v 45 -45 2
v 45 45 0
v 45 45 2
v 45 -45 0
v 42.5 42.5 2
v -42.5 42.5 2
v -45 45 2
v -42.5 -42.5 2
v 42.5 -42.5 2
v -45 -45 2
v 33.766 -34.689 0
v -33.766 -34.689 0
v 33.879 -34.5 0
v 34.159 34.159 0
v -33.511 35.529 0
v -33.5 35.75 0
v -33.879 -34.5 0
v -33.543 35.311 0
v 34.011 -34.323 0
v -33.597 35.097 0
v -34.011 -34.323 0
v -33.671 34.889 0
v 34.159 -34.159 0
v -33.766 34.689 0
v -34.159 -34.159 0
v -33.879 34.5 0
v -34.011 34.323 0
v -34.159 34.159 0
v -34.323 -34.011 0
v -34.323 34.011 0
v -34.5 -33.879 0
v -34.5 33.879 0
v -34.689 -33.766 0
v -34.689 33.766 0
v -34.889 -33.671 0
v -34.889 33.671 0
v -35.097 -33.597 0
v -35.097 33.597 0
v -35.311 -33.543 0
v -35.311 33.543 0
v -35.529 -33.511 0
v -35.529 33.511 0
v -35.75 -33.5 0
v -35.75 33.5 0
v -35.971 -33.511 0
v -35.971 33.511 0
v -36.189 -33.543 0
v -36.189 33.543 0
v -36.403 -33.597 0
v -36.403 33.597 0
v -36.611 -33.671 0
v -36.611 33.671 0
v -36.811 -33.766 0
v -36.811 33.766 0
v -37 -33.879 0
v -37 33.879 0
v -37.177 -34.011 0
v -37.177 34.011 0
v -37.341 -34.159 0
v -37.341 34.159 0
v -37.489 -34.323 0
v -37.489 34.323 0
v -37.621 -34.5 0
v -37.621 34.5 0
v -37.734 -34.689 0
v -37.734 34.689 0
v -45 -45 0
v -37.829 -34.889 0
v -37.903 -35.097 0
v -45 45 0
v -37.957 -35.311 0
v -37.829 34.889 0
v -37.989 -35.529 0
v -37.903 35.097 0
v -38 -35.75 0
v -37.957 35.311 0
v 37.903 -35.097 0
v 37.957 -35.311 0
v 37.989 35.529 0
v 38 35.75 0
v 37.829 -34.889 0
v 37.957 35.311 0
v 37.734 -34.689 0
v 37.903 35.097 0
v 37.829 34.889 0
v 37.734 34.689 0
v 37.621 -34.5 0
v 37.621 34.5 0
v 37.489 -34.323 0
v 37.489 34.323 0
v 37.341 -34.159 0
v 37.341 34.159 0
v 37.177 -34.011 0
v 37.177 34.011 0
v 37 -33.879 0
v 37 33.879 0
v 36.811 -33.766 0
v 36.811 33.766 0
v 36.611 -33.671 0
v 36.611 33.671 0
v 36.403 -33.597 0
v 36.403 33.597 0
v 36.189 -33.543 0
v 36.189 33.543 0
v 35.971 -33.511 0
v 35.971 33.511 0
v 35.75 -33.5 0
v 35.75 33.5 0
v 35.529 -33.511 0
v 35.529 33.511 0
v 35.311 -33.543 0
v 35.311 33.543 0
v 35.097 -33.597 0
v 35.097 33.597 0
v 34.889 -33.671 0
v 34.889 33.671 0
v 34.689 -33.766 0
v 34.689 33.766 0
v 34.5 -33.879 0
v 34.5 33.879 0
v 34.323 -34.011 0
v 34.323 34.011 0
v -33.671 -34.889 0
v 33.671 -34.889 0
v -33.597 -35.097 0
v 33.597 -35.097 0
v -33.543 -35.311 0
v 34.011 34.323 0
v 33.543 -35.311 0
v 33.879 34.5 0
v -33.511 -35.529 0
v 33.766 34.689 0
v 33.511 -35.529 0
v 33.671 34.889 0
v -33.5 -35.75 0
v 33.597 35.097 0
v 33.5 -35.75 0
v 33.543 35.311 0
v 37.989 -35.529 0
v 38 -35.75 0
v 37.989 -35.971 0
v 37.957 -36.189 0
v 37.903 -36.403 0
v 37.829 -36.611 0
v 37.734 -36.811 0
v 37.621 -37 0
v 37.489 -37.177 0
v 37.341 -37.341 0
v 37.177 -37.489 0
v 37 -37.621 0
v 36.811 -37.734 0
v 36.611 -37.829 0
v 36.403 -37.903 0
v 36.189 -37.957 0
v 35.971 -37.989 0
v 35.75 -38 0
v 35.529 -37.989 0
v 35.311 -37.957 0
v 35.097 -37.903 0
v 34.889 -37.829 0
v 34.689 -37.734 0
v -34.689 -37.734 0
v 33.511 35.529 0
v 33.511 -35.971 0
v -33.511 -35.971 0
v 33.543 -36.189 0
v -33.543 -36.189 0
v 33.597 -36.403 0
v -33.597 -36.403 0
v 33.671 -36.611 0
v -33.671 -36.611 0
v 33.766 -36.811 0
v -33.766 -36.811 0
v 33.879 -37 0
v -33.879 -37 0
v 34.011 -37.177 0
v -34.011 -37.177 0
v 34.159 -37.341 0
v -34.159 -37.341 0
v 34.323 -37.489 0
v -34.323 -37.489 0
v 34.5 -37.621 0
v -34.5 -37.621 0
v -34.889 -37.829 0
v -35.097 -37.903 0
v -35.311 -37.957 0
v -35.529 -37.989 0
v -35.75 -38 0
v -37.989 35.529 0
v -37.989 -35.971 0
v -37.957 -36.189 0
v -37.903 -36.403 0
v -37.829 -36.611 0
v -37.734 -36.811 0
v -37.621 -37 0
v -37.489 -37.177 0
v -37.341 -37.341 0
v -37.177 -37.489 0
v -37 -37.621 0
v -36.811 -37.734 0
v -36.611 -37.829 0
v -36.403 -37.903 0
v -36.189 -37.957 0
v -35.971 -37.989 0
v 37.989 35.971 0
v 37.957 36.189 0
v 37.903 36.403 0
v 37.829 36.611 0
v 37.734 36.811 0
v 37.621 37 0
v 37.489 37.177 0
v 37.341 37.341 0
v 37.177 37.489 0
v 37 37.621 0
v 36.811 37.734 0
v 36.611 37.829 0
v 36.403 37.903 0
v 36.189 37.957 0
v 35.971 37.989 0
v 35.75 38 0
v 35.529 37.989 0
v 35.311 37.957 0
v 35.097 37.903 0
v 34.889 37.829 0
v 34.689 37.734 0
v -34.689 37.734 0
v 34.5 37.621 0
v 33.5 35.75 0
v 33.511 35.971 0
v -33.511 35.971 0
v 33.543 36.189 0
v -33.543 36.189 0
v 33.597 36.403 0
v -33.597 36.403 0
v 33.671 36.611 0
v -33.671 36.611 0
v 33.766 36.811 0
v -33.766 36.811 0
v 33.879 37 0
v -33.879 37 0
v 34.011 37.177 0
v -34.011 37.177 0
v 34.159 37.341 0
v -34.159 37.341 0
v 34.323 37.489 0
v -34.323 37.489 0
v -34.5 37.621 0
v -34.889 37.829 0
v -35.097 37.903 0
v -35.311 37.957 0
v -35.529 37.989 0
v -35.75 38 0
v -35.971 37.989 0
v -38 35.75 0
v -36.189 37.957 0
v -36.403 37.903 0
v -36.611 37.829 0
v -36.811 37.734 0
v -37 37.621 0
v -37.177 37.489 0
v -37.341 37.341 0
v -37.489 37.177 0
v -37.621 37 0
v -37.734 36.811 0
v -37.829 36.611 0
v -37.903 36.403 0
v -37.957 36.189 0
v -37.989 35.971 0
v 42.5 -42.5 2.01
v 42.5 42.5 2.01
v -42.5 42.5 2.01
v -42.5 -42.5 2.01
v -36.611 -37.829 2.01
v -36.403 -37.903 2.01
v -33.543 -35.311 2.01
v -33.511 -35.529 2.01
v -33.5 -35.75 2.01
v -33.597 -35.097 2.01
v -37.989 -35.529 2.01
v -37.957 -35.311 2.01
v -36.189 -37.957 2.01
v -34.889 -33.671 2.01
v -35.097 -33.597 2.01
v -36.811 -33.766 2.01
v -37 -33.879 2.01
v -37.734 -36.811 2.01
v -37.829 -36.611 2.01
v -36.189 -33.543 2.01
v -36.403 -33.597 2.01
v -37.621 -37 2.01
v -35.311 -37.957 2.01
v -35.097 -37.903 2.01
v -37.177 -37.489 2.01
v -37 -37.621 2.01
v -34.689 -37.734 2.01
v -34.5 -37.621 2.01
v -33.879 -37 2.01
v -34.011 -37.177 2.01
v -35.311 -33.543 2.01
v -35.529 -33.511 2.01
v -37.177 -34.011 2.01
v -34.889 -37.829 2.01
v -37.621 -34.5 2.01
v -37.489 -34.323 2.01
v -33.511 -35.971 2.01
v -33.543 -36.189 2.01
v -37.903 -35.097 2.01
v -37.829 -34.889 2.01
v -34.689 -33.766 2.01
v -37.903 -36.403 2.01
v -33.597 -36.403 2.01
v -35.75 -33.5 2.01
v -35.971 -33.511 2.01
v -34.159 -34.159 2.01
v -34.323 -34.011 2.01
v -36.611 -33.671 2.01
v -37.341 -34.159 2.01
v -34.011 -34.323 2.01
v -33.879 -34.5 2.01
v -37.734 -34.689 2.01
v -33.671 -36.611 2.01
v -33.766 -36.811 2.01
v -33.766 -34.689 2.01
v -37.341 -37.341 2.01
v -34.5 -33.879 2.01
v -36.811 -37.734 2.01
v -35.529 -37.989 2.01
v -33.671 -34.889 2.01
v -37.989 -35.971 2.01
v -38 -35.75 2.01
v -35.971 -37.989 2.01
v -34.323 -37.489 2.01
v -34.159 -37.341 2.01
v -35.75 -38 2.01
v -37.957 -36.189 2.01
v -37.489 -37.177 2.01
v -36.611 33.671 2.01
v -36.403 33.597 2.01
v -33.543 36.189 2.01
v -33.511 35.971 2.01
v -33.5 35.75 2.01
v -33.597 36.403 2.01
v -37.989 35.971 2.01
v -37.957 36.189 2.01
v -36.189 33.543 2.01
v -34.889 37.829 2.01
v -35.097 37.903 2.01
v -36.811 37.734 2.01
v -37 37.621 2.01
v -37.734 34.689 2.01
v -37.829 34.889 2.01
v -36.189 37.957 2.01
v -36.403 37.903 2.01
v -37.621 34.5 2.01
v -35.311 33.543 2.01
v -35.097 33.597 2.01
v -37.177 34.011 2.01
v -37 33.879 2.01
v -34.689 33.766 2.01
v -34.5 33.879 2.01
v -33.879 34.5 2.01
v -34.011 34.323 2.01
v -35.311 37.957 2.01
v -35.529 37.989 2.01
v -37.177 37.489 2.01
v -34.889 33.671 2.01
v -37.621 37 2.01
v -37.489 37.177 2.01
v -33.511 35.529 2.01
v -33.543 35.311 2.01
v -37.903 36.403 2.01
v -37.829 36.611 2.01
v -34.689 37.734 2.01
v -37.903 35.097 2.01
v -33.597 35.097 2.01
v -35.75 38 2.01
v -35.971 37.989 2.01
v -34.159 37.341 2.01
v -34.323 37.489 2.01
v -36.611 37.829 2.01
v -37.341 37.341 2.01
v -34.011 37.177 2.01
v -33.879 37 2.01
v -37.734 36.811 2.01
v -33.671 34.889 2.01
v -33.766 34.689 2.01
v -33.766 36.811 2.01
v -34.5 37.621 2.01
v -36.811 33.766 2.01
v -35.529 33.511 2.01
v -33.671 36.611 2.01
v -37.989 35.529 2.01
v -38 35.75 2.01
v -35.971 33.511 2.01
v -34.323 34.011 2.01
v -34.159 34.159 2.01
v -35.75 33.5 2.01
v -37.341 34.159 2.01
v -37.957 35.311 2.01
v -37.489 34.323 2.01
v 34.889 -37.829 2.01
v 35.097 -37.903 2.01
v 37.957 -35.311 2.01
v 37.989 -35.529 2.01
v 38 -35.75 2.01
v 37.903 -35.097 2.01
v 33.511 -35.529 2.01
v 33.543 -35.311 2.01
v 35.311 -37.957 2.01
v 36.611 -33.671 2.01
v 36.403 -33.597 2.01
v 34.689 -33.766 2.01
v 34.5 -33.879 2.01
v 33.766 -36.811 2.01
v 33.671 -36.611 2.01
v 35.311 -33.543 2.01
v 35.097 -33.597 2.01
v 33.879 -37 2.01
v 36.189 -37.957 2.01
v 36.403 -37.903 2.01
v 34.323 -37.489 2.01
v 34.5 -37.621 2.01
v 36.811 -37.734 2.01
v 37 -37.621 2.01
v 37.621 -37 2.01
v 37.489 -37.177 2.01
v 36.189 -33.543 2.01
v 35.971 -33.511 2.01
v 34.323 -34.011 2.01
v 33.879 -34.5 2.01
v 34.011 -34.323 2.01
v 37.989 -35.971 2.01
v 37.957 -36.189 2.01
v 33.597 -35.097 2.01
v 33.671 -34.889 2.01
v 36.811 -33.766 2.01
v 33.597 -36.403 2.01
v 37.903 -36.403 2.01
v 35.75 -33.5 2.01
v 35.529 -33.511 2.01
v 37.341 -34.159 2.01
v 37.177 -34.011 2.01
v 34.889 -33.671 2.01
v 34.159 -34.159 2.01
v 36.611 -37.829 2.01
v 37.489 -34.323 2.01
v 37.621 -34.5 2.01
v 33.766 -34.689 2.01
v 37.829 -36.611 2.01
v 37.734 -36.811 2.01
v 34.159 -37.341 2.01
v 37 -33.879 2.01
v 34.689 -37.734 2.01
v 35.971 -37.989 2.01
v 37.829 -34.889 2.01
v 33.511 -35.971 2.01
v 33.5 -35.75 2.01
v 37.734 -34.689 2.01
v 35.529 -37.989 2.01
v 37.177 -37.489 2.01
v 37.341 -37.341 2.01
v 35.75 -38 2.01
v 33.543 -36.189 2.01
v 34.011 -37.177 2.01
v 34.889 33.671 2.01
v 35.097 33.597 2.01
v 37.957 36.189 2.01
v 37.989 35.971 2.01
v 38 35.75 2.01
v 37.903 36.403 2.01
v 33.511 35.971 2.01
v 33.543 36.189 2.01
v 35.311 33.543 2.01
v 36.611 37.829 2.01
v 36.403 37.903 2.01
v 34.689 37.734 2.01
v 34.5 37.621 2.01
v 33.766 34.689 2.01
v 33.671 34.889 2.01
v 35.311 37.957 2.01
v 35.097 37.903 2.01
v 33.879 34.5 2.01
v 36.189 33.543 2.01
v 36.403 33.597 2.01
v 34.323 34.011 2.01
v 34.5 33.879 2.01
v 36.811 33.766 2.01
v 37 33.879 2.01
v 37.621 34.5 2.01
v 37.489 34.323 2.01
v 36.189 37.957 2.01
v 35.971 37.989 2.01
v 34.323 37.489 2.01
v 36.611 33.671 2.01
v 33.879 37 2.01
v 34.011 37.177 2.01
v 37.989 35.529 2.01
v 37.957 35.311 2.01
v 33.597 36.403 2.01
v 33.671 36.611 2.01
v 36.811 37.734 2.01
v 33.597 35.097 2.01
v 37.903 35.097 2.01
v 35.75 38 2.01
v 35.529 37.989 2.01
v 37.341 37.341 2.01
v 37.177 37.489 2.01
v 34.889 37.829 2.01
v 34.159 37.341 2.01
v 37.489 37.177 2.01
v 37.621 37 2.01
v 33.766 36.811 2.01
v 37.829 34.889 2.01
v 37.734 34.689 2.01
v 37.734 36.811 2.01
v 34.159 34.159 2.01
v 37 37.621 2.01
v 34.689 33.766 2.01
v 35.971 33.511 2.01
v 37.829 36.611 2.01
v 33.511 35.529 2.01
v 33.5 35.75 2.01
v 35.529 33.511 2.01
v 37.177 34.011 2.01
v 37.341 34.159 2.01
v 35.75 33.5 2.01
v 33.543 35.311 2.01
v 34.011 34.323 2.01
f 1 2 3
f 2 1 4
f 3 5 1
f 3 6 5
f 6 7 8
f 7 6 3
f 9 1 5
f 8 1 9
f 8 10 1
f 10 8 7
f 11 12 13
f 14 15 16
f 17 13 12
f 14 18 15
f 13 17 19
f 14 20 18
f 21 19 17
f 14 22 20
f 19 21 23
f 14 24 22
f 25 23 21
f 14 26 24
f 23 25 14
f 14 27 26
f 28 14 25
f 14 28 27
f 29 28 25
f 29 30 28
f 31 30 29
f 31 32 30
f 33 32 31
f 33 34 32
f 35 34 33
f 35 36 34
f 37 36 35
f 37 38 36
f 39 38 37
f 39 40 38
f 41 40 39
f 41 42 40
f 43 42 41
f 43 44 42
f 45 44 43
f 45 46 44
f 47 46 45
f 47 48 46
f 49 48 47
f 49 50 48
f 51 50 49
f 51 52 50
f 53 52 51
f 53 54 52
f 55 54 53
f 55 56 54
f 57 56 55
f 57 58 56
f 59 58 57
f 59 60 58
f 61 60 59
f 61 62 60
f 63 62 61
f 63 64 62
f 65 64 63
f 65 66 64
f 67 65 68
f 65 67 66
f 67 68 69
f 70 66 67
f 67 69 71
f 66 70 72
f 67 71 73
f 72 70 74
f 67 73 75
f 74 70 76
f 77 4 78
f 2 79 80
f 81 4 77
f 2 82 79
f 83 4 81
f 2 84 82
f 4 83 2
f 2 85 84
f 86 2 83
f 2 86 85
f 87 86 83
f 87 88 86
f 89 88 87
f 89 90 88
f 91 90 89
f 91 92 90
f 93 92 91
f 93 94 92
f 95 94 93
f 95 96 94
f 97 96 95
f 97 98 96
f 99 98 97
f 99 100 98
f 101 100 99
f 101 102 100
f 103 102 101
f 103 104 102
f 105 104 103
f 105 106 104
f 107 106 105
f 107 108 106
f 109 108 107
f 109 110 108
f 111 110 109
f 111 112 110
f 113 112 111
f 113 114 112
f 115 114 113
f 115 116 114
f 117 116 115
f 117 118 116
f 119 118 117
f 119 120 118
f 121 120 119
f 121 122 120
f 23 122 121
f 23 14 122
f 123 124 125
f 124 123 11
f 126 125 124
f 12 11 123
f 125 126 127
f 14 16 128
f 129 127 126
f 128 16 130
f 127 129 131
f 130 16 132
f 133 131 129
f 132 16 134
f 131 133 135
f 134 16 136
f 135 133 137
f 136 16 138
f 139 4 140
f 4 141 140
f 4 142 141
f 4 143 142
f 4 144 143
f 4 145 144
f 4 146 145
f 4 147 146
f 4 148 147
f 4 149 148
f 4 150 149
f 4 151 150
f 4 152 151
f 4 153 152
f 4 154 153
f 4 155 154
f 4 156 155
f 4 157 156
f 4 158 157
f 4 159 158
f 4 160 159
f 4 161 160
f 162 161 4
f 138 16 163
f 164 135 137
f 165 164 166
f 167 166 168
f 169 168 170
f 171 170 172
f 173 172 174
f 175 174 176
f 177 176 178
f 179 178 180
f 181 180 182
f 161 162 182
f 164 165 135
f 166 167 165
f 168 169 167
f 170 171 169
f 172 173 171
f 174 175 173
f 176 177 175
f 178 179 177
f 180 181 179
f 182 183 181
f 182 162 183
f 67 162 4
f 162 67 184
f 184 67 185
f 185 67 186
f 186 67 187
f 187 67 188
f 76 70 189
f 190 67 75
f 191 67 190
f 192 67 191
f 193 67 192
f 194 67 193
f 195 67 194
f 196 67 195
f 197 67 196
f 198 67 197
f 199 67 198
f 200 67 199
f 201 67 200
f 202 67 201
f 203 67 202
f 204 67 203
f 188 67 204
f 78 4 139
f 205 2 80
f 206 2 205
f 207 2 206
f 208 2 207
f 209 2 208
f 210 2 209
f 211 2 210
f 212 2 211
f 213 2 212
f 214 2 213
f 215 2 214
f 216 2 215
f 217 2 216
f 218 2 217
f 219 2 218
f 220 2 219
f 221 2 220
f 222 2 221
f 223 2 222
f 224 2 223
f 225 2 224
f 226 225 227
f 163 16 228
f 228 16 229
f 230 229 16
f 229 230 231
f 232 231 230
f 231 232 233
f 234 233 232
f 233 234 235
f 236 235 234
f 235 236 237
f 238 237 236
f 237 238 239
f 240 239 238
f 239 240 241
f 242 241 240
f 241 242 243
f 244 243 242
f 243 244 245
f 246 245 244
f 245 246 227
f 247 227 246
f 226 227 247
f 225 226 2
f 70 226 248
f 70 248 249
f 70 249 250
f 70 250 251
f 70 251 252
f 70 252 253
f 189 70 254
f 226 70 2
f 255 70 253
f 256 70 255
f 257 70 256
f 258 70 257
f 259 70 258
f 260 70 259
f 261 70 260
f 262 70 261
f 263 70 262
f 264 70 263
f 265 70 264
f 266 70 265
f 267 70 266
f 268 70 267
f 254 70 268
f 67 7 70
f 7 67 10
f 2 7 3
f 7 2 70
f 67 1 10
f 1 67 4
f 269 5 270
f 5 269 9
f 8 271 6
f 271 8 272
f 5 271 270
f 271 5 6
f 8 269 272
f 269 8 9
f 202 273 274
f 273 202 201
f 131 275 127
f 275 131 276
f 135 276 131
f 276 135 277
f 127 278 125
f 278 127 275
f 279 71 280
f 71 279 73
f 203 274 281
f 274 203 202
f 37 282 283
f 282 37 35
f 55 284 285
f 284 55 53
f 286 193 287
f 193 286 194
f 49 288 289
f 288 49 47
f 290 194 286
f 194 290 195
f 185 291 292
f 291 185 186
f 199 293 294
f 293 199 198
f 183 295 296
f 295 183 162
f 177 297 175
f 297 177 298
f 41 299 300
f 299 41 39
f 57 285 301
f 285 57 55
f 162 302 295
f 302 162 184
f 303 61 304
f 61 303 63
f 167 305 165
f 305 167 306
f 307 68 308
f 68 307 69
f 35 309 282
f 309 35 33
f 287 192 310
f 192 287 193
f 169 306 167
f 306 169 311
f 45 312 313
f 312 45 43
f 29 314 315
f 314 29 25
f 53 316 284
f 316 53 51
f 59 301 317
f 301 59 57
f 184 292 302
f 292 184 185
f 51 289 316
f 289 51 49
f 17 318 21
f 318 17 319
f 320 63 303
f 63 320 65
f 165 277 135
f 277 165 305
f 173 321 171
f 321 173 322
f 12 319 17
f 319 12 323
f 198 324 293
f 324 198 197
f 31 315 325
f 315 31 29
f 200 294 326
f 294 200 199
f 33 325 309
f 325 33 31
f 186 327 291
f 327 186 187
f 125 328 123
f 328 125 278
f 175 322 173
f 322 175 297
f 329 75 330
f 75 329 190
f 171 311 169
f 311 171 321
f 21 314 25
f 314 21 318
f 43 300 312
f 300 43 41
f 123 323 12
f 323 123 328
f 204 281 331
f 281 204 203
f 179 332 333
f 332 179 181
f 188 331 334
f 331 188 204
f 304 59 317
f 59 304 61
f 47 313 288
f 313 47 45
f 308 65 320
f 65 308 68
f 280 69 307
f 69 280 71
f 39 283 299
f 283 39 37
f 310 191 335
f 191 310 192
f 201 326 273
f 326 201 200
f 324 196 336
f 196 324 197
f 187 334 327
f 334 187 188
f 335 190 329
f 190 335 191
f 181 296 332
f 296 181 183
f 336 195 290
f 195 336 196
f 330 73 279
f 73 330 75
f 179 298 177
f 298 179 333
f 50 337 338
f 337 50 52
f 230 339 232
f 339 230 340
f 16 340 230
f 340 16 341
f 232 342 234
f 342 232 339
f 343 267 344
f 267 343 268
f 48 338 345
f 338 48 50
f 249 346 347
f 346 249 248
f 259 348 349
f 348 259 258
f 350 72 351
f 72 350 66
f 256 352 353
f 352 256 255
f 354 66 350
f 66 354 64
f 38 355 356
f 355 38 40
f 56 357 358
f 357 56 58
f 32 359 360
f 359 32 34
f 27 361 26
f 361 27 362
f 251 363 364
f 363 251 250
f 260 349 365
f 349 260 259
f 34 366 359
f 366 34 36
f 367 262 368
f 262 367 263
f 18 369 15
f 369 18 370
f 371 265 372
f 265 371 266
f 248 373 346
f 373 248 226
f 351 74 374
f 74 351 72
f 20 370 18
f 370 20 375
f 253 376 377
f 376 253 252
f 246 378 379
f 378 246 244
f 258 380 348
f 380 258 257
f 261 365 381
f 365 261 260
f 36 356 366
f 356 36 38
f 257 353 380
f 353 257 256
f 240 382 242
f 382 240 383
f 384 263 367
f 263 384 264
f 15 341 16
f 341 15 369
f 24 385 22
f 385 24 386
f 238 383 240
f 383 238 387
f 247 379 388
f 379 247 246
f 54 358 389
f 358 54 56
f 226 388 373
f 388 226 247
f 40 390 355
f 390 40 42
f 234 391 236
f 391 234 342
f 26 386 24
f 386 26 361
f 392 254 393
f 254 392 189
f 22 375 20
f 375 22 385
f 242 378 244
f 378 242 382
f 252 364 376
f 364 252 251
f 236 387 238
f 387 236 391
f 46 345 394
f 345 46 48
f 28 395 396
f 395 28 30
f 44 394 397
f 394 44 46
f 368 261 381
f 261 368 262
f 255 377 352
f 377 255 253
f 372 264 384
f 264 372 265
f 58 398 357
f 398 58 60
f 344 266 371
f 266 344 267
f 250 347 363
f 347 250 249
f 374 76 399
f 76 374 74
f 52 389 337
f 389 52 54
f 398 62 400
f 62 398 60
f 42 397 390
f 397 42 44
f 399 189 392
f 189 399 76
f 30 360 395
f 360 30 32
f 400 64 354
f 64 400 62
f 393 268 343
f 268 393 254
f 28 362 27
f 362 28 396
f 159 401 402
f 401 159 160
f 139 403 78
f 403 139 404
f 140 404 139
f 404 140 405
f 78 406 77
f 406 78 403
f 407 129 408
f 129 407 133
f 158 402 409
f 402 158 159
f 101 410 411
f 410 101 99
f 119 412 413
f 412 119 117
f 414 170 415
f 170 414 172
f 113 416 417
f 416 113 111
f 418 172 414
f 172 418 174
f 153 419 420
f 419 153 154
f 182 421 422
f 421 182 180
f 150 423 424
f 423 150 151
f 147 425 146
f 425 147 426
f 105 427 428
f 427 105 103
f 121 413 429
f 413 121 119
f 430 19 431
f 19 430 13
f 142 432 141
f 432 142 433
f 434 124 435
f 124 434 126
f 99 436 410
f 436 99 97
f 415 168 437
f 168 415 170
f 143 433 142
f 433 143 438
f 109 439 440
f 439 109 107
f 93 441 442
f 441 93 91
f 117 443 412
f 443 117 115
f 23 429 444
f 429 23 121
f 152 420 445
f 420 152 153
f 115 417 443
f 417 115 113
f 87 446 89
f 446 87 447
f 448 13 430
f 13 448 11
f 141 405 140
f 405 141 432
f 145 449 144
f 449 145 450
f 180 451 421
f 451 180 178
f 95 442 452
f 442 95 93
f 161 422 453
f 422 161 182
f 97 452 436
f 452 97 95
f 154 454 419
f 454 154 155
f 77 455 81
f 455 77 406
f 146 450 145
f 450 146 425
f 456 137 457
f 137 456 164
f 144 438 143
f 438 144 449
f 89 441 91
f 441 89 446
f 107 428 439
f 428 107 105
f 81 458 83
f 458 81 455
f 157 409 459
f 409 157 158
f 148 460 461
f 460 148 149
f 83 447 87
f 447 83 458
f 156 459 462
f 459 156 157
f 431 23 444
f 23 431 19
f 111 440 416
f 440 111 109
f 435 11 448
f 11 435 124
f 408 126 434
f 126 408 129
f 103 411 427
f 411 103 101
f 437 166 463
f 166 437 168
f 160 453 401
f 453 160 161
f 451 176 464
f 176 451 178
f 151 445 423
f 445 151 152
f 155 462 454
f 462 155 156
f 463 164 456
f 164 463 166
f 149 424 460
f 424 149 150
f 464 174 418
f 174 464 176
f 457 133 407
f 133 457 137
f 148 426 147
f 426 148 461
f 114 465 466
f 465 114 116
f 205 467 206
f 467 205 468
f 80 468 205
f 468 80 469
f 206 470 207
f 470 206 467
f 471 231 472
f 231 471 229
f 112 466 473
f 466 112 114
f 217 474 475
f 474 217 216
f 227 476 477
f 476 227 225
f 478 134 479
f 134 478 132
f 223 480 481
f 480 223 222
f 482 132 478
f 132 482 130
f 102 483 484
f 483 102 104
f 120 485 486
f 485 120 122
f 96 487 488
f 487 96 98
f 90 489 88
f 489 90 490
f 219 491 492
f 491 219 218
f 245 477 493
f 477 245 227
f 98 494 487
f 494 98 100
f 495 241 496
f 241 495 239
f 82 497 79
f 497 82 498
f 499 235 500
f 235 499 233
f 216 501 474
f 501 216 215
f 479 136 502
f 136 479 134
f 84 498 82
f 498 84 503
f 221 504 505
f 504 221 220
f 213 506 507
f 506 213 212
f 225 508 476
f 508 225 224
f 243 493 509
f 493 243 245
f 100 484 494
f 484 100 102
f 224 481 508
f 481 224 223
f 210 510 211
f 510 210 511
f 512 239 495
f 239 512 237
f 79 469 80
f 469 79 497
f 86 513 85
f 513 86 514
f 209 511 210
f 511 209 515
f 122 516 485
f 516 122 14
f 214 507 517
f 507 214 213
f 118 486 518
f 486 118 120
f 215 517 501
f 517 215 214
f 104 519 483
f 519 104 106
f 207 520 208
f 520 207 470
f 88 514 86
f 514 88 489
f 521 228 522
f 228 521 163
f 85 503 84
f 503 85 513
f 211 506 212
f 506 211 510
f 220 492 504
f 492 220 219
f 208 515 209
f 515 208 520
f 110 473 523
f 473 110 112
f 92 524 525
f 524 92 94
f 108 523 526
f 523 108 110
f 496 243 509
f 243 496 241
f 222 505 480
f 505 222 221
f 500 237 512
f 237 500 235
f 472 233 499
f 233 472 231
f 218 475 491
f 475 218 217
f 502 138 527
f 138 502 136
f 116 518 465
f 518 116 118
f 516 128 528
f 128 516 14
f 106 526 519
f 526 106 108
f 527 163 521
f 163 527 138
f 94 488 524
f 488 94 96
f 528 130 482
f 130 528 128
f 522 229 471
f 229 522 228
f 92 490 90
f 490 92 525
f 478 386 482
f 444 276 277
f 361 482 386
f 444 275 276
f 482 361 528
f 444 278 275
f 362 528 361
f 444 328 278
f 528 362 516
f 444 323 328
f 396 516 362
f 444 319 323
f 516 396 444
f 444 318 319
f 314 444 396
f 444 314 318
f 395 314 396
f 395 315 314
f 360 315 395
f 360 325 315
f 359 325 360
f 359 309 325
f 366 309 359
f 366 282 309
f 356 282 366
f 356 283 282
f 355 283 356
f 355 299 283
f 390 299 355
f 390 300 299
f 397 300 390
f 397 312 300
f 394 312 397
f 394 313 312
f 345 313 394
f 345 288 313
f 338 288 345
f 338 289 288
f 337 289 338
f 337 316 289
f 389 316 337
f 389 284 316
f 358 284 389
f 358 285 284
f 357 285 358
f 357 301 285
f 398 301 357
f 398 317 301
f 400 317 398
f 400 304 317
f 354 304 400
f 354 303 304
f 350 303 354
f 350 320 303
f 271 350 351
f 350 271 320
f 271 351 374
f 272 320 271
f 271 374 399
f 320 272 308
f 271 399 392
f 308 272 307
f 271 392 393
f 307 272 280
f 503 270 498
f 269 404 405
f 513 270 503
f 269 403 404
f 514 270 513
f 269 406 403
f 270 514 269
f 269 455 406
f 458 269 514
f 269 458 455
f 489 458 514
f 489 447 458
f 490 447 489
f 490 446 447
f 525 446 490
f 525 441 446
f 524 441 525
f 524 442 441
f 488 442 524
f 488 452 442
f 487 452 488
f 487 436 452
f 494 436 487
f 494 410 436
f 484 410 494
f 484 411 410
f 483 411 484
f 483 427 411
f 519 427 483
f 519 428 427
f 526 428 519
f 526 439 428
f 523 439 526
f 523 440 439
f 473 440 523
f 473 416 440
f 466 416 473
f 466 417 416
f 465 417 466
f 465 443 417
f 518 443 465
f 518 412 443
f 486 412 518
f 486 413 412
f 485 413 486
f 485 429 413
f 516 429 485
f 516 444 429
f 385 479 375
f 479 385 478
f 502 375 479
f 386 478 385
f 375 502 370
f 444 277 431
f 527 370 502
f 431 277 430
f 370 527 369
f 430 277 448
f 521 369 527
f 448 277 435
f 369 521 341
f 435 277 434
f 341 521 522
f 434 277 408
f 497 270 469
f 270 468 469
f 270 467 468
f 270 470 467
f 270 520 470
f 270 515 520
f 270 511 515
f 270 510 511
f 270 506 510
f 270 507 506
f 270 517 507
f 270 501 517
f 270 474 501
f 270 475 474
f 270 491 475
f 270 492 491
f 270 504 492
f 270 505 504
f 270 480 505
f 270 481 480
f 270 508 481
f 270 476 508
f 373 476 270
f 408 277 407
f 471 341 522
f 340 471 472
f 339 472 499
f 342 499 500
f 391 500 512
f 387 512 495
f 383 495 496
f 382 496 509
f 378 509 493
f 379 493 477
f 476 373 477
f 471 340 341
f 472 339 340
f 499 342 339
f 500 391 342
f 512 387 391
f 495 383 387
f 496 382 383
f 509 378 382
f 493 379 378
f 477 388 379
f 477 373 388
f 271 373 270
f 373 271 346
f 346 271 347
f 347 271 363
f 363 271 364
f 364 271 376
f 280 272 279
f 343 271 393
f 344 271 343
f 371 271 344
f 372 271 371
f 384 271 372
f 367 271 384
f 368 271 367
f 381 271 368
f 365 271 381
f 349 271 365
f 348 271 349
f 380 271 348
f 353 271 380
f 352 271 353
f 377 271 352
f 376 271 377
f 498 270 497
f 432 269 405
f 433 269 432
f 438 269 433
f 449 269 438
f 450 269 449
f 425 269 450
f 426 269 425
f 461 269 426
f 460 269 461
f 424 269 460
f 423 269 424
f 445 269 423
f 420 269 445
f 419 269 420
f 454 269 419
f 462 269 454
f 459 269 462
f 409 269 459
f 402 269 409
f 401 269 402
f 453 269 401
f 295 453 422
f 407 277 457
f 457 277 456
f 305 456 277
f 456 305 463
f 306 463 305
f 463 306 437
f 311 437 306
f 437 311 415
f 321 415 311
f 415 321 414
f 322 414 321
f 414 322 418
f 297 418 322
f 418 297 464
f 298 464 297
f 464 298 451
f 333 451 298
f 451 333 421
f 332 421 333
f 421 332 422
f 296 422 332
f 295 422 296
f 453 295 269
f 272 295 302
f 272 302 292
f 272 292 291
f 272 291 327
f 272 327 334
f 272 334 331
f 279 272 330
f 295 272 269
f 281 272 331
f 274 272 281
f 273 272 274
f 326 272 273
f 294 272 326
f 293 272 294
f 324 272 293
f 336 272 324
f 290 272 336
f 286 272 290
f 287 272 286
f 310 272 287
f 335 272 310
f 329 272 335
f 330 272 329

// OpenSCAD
// --- Dimensions (mm) ---
outer_width = 90;          // Outer width and length of the box
outer_length = 90;         // Outer length and width of the box
wall_thickness = 2.5;       // Thickness of the four vertical walls
top_plate_thickness = 2;    // Thickness of the stirring surface (bottom of the box)
total_height = 40;         // Total height of the housing
screw_hole_diameter = 4.5;  // Diameter for M4 screw holes
screw_pattern_size = 71.5; // Distance between screw holes (center-to-center)
notch_width = 12;          // Width of the cable notch
notch_depth = 8;           // Depth of the notch from the open top
notch_height = 8;          // Height of the notch (from z=32 to z=40)

// --- Constants ---
$fn = 64;

// --- Modeling ---

// The part is printed upside down.
// The top plate (stirring surface) is at Z = 0 to Z = top_plate_thickness.
// The walls rise from Z = top_plate_thickness to Z = total_height.

module stirrer_housing() {
    difference() {
        // Main Body (The solid block)
        union() {
            // The top plate (resting on bed)
            cube([outer_width, outer_length, top_plate_thickness], center = true);
            
            // The four walls
            translate([0, 0, top_plate_thickness + (total_height - top_plate_thickness) / 2])
            cube([outer_width, outer_length, total_height - top_plate_thickness], center = true);
        }

        // 1. Hollow out the inside to create the box cavity
        // We subtract a smaller cube from the center
        // We extend the subtraction slightly to ensure a clean cut through the top plate
        translate([0, 0, -0.01]) // Ensure it cuts through the bottom plate
        cube([outer_width - 2 * wall_thickness, outer_length - 2 * wall_thickness, total_height], center = true);

        // 2. Screw holes for the fan
        // Pattern is 71.5mm square, centered.
        // We use a loop to place the 4 holes.
        // We extend the Z dimension to ensure they cut through the plate.
        for (x = [-screw_pattern_size/2, screw_pattern_size/2]) {
            for (y = [-screw_pattern_size/2, screw_pattern_size/2]) {
                translate([x, y, -1])
                cylinder(d = screw_hole_diameter, h = top_plate_thickness + 2);
            }
        }

        // 3. Cable notch
        // Located in one wall, centered along the wall, 
        // reaching 8mm down from the open edge (z=32 to z=40).
        // Since the part is printed upside down, the "open edge" is at Z = 40.
        // The notch is at the top of the printed object.
        // In our coordinate system, the top of the object is at Z = 40.
        // The notch is between Z = 32 and Z = 40.
        // We place it on the wall at X = outer_width/2.
        translate([outer_width/2, 0, total_height - (notch_height/2)])
        cube([notch_width, notch_depth + 1, notch_height], center = true);
        
        // Note: The notch logic above is slightly simplified. 
        // Let's refine the notch to be exactly on one wall.
        // The notch is 12mm wide, centered on the wall, 8mm deep from the top.
        // The wall is at X = 45. The notch is centered at Y=0.
        // The notch width is along Y. The notch depth is along X.
        // The notch height is along Z.
        
        // Re-calculating notch:
        // Center of notch is at X = outer_width/2, Y = 0, Z = total_height - 4
        // Notch dimensions: width (Y) = 12, depth (X) = wall_thickness + 1, height (Z) = 8
        translate([outer_width/2, 0, total_height - 4])
        cube([wall_thickness + 2, notch_width, notch_height], center = true);
    }
}

// Render the part
// The part is centered on XY. 
// The top plate is at Z=0 to Z=2.
// To achieve this, we translate the whole object so the bottom of the plate is at Z=0.
// Since the module is centered, we shift it up by (total_height/2) - (top_plate_thickness/2) 
// No, the module is centered on Z. The plate is at the bottom of the module.
// Let's adjust the module to be built from Z=0 upwards.

module stirrer_housing_final() {
    // We build the object starting from Z=0
    difference() {
        // The solid outer shell
        union() {
            // Top plate (on bed)
            cube([outer_width, outer_length, top_plate_thickness]);
            
            // Walls
            translate([wall_thickness, wall_thickness, top_plate_thickness])
            cube([outer_width - 2*wall_thickness, outer_length - 2*wall_thickness, total_height - top_plate_thickness]);
        }

        // The hollow interior
        translate([wall_thickness, wall_thickness, top_plate_thickness + 0.01])
        cube([outer_width - 2*wall_thickness, outer_length - 2*wall_thickness, total_height]);

        // Screw holes (through the plate)
        for (x = [-screw_pattern_size/2, screw_pattern_size/2]) {
            for (y = [-screw_pattern_size/2, screw_pattern_size/2]) {
                translate([outer_width/2 + x, outer_length/2 + y, -1])
                cylinder(d = screw_hole_diameter, h = top_plate_thickness + 2);
            }
        }

        // Cable notch
        // "In one wall, cut a notch... 12mm wide, centered along the wall, 
        // reaching 8mm down from the open edge (from z=32 to z=40)"
        // The open edge is at Z = 40.
        // The notch is 12mm wide (along Y), 8mm deep (along X), 8mm high (along Z).
        translate([outer_width, outer_length/2, total_height - 4])
        cube([wall_thickness + 2, notch_width, notch_height], center = true);
    }
}

// Center the model on XY and place it on the bed
translate([-outer_width/2, -outer_length/2, 0])
stirrer_housing_final();
